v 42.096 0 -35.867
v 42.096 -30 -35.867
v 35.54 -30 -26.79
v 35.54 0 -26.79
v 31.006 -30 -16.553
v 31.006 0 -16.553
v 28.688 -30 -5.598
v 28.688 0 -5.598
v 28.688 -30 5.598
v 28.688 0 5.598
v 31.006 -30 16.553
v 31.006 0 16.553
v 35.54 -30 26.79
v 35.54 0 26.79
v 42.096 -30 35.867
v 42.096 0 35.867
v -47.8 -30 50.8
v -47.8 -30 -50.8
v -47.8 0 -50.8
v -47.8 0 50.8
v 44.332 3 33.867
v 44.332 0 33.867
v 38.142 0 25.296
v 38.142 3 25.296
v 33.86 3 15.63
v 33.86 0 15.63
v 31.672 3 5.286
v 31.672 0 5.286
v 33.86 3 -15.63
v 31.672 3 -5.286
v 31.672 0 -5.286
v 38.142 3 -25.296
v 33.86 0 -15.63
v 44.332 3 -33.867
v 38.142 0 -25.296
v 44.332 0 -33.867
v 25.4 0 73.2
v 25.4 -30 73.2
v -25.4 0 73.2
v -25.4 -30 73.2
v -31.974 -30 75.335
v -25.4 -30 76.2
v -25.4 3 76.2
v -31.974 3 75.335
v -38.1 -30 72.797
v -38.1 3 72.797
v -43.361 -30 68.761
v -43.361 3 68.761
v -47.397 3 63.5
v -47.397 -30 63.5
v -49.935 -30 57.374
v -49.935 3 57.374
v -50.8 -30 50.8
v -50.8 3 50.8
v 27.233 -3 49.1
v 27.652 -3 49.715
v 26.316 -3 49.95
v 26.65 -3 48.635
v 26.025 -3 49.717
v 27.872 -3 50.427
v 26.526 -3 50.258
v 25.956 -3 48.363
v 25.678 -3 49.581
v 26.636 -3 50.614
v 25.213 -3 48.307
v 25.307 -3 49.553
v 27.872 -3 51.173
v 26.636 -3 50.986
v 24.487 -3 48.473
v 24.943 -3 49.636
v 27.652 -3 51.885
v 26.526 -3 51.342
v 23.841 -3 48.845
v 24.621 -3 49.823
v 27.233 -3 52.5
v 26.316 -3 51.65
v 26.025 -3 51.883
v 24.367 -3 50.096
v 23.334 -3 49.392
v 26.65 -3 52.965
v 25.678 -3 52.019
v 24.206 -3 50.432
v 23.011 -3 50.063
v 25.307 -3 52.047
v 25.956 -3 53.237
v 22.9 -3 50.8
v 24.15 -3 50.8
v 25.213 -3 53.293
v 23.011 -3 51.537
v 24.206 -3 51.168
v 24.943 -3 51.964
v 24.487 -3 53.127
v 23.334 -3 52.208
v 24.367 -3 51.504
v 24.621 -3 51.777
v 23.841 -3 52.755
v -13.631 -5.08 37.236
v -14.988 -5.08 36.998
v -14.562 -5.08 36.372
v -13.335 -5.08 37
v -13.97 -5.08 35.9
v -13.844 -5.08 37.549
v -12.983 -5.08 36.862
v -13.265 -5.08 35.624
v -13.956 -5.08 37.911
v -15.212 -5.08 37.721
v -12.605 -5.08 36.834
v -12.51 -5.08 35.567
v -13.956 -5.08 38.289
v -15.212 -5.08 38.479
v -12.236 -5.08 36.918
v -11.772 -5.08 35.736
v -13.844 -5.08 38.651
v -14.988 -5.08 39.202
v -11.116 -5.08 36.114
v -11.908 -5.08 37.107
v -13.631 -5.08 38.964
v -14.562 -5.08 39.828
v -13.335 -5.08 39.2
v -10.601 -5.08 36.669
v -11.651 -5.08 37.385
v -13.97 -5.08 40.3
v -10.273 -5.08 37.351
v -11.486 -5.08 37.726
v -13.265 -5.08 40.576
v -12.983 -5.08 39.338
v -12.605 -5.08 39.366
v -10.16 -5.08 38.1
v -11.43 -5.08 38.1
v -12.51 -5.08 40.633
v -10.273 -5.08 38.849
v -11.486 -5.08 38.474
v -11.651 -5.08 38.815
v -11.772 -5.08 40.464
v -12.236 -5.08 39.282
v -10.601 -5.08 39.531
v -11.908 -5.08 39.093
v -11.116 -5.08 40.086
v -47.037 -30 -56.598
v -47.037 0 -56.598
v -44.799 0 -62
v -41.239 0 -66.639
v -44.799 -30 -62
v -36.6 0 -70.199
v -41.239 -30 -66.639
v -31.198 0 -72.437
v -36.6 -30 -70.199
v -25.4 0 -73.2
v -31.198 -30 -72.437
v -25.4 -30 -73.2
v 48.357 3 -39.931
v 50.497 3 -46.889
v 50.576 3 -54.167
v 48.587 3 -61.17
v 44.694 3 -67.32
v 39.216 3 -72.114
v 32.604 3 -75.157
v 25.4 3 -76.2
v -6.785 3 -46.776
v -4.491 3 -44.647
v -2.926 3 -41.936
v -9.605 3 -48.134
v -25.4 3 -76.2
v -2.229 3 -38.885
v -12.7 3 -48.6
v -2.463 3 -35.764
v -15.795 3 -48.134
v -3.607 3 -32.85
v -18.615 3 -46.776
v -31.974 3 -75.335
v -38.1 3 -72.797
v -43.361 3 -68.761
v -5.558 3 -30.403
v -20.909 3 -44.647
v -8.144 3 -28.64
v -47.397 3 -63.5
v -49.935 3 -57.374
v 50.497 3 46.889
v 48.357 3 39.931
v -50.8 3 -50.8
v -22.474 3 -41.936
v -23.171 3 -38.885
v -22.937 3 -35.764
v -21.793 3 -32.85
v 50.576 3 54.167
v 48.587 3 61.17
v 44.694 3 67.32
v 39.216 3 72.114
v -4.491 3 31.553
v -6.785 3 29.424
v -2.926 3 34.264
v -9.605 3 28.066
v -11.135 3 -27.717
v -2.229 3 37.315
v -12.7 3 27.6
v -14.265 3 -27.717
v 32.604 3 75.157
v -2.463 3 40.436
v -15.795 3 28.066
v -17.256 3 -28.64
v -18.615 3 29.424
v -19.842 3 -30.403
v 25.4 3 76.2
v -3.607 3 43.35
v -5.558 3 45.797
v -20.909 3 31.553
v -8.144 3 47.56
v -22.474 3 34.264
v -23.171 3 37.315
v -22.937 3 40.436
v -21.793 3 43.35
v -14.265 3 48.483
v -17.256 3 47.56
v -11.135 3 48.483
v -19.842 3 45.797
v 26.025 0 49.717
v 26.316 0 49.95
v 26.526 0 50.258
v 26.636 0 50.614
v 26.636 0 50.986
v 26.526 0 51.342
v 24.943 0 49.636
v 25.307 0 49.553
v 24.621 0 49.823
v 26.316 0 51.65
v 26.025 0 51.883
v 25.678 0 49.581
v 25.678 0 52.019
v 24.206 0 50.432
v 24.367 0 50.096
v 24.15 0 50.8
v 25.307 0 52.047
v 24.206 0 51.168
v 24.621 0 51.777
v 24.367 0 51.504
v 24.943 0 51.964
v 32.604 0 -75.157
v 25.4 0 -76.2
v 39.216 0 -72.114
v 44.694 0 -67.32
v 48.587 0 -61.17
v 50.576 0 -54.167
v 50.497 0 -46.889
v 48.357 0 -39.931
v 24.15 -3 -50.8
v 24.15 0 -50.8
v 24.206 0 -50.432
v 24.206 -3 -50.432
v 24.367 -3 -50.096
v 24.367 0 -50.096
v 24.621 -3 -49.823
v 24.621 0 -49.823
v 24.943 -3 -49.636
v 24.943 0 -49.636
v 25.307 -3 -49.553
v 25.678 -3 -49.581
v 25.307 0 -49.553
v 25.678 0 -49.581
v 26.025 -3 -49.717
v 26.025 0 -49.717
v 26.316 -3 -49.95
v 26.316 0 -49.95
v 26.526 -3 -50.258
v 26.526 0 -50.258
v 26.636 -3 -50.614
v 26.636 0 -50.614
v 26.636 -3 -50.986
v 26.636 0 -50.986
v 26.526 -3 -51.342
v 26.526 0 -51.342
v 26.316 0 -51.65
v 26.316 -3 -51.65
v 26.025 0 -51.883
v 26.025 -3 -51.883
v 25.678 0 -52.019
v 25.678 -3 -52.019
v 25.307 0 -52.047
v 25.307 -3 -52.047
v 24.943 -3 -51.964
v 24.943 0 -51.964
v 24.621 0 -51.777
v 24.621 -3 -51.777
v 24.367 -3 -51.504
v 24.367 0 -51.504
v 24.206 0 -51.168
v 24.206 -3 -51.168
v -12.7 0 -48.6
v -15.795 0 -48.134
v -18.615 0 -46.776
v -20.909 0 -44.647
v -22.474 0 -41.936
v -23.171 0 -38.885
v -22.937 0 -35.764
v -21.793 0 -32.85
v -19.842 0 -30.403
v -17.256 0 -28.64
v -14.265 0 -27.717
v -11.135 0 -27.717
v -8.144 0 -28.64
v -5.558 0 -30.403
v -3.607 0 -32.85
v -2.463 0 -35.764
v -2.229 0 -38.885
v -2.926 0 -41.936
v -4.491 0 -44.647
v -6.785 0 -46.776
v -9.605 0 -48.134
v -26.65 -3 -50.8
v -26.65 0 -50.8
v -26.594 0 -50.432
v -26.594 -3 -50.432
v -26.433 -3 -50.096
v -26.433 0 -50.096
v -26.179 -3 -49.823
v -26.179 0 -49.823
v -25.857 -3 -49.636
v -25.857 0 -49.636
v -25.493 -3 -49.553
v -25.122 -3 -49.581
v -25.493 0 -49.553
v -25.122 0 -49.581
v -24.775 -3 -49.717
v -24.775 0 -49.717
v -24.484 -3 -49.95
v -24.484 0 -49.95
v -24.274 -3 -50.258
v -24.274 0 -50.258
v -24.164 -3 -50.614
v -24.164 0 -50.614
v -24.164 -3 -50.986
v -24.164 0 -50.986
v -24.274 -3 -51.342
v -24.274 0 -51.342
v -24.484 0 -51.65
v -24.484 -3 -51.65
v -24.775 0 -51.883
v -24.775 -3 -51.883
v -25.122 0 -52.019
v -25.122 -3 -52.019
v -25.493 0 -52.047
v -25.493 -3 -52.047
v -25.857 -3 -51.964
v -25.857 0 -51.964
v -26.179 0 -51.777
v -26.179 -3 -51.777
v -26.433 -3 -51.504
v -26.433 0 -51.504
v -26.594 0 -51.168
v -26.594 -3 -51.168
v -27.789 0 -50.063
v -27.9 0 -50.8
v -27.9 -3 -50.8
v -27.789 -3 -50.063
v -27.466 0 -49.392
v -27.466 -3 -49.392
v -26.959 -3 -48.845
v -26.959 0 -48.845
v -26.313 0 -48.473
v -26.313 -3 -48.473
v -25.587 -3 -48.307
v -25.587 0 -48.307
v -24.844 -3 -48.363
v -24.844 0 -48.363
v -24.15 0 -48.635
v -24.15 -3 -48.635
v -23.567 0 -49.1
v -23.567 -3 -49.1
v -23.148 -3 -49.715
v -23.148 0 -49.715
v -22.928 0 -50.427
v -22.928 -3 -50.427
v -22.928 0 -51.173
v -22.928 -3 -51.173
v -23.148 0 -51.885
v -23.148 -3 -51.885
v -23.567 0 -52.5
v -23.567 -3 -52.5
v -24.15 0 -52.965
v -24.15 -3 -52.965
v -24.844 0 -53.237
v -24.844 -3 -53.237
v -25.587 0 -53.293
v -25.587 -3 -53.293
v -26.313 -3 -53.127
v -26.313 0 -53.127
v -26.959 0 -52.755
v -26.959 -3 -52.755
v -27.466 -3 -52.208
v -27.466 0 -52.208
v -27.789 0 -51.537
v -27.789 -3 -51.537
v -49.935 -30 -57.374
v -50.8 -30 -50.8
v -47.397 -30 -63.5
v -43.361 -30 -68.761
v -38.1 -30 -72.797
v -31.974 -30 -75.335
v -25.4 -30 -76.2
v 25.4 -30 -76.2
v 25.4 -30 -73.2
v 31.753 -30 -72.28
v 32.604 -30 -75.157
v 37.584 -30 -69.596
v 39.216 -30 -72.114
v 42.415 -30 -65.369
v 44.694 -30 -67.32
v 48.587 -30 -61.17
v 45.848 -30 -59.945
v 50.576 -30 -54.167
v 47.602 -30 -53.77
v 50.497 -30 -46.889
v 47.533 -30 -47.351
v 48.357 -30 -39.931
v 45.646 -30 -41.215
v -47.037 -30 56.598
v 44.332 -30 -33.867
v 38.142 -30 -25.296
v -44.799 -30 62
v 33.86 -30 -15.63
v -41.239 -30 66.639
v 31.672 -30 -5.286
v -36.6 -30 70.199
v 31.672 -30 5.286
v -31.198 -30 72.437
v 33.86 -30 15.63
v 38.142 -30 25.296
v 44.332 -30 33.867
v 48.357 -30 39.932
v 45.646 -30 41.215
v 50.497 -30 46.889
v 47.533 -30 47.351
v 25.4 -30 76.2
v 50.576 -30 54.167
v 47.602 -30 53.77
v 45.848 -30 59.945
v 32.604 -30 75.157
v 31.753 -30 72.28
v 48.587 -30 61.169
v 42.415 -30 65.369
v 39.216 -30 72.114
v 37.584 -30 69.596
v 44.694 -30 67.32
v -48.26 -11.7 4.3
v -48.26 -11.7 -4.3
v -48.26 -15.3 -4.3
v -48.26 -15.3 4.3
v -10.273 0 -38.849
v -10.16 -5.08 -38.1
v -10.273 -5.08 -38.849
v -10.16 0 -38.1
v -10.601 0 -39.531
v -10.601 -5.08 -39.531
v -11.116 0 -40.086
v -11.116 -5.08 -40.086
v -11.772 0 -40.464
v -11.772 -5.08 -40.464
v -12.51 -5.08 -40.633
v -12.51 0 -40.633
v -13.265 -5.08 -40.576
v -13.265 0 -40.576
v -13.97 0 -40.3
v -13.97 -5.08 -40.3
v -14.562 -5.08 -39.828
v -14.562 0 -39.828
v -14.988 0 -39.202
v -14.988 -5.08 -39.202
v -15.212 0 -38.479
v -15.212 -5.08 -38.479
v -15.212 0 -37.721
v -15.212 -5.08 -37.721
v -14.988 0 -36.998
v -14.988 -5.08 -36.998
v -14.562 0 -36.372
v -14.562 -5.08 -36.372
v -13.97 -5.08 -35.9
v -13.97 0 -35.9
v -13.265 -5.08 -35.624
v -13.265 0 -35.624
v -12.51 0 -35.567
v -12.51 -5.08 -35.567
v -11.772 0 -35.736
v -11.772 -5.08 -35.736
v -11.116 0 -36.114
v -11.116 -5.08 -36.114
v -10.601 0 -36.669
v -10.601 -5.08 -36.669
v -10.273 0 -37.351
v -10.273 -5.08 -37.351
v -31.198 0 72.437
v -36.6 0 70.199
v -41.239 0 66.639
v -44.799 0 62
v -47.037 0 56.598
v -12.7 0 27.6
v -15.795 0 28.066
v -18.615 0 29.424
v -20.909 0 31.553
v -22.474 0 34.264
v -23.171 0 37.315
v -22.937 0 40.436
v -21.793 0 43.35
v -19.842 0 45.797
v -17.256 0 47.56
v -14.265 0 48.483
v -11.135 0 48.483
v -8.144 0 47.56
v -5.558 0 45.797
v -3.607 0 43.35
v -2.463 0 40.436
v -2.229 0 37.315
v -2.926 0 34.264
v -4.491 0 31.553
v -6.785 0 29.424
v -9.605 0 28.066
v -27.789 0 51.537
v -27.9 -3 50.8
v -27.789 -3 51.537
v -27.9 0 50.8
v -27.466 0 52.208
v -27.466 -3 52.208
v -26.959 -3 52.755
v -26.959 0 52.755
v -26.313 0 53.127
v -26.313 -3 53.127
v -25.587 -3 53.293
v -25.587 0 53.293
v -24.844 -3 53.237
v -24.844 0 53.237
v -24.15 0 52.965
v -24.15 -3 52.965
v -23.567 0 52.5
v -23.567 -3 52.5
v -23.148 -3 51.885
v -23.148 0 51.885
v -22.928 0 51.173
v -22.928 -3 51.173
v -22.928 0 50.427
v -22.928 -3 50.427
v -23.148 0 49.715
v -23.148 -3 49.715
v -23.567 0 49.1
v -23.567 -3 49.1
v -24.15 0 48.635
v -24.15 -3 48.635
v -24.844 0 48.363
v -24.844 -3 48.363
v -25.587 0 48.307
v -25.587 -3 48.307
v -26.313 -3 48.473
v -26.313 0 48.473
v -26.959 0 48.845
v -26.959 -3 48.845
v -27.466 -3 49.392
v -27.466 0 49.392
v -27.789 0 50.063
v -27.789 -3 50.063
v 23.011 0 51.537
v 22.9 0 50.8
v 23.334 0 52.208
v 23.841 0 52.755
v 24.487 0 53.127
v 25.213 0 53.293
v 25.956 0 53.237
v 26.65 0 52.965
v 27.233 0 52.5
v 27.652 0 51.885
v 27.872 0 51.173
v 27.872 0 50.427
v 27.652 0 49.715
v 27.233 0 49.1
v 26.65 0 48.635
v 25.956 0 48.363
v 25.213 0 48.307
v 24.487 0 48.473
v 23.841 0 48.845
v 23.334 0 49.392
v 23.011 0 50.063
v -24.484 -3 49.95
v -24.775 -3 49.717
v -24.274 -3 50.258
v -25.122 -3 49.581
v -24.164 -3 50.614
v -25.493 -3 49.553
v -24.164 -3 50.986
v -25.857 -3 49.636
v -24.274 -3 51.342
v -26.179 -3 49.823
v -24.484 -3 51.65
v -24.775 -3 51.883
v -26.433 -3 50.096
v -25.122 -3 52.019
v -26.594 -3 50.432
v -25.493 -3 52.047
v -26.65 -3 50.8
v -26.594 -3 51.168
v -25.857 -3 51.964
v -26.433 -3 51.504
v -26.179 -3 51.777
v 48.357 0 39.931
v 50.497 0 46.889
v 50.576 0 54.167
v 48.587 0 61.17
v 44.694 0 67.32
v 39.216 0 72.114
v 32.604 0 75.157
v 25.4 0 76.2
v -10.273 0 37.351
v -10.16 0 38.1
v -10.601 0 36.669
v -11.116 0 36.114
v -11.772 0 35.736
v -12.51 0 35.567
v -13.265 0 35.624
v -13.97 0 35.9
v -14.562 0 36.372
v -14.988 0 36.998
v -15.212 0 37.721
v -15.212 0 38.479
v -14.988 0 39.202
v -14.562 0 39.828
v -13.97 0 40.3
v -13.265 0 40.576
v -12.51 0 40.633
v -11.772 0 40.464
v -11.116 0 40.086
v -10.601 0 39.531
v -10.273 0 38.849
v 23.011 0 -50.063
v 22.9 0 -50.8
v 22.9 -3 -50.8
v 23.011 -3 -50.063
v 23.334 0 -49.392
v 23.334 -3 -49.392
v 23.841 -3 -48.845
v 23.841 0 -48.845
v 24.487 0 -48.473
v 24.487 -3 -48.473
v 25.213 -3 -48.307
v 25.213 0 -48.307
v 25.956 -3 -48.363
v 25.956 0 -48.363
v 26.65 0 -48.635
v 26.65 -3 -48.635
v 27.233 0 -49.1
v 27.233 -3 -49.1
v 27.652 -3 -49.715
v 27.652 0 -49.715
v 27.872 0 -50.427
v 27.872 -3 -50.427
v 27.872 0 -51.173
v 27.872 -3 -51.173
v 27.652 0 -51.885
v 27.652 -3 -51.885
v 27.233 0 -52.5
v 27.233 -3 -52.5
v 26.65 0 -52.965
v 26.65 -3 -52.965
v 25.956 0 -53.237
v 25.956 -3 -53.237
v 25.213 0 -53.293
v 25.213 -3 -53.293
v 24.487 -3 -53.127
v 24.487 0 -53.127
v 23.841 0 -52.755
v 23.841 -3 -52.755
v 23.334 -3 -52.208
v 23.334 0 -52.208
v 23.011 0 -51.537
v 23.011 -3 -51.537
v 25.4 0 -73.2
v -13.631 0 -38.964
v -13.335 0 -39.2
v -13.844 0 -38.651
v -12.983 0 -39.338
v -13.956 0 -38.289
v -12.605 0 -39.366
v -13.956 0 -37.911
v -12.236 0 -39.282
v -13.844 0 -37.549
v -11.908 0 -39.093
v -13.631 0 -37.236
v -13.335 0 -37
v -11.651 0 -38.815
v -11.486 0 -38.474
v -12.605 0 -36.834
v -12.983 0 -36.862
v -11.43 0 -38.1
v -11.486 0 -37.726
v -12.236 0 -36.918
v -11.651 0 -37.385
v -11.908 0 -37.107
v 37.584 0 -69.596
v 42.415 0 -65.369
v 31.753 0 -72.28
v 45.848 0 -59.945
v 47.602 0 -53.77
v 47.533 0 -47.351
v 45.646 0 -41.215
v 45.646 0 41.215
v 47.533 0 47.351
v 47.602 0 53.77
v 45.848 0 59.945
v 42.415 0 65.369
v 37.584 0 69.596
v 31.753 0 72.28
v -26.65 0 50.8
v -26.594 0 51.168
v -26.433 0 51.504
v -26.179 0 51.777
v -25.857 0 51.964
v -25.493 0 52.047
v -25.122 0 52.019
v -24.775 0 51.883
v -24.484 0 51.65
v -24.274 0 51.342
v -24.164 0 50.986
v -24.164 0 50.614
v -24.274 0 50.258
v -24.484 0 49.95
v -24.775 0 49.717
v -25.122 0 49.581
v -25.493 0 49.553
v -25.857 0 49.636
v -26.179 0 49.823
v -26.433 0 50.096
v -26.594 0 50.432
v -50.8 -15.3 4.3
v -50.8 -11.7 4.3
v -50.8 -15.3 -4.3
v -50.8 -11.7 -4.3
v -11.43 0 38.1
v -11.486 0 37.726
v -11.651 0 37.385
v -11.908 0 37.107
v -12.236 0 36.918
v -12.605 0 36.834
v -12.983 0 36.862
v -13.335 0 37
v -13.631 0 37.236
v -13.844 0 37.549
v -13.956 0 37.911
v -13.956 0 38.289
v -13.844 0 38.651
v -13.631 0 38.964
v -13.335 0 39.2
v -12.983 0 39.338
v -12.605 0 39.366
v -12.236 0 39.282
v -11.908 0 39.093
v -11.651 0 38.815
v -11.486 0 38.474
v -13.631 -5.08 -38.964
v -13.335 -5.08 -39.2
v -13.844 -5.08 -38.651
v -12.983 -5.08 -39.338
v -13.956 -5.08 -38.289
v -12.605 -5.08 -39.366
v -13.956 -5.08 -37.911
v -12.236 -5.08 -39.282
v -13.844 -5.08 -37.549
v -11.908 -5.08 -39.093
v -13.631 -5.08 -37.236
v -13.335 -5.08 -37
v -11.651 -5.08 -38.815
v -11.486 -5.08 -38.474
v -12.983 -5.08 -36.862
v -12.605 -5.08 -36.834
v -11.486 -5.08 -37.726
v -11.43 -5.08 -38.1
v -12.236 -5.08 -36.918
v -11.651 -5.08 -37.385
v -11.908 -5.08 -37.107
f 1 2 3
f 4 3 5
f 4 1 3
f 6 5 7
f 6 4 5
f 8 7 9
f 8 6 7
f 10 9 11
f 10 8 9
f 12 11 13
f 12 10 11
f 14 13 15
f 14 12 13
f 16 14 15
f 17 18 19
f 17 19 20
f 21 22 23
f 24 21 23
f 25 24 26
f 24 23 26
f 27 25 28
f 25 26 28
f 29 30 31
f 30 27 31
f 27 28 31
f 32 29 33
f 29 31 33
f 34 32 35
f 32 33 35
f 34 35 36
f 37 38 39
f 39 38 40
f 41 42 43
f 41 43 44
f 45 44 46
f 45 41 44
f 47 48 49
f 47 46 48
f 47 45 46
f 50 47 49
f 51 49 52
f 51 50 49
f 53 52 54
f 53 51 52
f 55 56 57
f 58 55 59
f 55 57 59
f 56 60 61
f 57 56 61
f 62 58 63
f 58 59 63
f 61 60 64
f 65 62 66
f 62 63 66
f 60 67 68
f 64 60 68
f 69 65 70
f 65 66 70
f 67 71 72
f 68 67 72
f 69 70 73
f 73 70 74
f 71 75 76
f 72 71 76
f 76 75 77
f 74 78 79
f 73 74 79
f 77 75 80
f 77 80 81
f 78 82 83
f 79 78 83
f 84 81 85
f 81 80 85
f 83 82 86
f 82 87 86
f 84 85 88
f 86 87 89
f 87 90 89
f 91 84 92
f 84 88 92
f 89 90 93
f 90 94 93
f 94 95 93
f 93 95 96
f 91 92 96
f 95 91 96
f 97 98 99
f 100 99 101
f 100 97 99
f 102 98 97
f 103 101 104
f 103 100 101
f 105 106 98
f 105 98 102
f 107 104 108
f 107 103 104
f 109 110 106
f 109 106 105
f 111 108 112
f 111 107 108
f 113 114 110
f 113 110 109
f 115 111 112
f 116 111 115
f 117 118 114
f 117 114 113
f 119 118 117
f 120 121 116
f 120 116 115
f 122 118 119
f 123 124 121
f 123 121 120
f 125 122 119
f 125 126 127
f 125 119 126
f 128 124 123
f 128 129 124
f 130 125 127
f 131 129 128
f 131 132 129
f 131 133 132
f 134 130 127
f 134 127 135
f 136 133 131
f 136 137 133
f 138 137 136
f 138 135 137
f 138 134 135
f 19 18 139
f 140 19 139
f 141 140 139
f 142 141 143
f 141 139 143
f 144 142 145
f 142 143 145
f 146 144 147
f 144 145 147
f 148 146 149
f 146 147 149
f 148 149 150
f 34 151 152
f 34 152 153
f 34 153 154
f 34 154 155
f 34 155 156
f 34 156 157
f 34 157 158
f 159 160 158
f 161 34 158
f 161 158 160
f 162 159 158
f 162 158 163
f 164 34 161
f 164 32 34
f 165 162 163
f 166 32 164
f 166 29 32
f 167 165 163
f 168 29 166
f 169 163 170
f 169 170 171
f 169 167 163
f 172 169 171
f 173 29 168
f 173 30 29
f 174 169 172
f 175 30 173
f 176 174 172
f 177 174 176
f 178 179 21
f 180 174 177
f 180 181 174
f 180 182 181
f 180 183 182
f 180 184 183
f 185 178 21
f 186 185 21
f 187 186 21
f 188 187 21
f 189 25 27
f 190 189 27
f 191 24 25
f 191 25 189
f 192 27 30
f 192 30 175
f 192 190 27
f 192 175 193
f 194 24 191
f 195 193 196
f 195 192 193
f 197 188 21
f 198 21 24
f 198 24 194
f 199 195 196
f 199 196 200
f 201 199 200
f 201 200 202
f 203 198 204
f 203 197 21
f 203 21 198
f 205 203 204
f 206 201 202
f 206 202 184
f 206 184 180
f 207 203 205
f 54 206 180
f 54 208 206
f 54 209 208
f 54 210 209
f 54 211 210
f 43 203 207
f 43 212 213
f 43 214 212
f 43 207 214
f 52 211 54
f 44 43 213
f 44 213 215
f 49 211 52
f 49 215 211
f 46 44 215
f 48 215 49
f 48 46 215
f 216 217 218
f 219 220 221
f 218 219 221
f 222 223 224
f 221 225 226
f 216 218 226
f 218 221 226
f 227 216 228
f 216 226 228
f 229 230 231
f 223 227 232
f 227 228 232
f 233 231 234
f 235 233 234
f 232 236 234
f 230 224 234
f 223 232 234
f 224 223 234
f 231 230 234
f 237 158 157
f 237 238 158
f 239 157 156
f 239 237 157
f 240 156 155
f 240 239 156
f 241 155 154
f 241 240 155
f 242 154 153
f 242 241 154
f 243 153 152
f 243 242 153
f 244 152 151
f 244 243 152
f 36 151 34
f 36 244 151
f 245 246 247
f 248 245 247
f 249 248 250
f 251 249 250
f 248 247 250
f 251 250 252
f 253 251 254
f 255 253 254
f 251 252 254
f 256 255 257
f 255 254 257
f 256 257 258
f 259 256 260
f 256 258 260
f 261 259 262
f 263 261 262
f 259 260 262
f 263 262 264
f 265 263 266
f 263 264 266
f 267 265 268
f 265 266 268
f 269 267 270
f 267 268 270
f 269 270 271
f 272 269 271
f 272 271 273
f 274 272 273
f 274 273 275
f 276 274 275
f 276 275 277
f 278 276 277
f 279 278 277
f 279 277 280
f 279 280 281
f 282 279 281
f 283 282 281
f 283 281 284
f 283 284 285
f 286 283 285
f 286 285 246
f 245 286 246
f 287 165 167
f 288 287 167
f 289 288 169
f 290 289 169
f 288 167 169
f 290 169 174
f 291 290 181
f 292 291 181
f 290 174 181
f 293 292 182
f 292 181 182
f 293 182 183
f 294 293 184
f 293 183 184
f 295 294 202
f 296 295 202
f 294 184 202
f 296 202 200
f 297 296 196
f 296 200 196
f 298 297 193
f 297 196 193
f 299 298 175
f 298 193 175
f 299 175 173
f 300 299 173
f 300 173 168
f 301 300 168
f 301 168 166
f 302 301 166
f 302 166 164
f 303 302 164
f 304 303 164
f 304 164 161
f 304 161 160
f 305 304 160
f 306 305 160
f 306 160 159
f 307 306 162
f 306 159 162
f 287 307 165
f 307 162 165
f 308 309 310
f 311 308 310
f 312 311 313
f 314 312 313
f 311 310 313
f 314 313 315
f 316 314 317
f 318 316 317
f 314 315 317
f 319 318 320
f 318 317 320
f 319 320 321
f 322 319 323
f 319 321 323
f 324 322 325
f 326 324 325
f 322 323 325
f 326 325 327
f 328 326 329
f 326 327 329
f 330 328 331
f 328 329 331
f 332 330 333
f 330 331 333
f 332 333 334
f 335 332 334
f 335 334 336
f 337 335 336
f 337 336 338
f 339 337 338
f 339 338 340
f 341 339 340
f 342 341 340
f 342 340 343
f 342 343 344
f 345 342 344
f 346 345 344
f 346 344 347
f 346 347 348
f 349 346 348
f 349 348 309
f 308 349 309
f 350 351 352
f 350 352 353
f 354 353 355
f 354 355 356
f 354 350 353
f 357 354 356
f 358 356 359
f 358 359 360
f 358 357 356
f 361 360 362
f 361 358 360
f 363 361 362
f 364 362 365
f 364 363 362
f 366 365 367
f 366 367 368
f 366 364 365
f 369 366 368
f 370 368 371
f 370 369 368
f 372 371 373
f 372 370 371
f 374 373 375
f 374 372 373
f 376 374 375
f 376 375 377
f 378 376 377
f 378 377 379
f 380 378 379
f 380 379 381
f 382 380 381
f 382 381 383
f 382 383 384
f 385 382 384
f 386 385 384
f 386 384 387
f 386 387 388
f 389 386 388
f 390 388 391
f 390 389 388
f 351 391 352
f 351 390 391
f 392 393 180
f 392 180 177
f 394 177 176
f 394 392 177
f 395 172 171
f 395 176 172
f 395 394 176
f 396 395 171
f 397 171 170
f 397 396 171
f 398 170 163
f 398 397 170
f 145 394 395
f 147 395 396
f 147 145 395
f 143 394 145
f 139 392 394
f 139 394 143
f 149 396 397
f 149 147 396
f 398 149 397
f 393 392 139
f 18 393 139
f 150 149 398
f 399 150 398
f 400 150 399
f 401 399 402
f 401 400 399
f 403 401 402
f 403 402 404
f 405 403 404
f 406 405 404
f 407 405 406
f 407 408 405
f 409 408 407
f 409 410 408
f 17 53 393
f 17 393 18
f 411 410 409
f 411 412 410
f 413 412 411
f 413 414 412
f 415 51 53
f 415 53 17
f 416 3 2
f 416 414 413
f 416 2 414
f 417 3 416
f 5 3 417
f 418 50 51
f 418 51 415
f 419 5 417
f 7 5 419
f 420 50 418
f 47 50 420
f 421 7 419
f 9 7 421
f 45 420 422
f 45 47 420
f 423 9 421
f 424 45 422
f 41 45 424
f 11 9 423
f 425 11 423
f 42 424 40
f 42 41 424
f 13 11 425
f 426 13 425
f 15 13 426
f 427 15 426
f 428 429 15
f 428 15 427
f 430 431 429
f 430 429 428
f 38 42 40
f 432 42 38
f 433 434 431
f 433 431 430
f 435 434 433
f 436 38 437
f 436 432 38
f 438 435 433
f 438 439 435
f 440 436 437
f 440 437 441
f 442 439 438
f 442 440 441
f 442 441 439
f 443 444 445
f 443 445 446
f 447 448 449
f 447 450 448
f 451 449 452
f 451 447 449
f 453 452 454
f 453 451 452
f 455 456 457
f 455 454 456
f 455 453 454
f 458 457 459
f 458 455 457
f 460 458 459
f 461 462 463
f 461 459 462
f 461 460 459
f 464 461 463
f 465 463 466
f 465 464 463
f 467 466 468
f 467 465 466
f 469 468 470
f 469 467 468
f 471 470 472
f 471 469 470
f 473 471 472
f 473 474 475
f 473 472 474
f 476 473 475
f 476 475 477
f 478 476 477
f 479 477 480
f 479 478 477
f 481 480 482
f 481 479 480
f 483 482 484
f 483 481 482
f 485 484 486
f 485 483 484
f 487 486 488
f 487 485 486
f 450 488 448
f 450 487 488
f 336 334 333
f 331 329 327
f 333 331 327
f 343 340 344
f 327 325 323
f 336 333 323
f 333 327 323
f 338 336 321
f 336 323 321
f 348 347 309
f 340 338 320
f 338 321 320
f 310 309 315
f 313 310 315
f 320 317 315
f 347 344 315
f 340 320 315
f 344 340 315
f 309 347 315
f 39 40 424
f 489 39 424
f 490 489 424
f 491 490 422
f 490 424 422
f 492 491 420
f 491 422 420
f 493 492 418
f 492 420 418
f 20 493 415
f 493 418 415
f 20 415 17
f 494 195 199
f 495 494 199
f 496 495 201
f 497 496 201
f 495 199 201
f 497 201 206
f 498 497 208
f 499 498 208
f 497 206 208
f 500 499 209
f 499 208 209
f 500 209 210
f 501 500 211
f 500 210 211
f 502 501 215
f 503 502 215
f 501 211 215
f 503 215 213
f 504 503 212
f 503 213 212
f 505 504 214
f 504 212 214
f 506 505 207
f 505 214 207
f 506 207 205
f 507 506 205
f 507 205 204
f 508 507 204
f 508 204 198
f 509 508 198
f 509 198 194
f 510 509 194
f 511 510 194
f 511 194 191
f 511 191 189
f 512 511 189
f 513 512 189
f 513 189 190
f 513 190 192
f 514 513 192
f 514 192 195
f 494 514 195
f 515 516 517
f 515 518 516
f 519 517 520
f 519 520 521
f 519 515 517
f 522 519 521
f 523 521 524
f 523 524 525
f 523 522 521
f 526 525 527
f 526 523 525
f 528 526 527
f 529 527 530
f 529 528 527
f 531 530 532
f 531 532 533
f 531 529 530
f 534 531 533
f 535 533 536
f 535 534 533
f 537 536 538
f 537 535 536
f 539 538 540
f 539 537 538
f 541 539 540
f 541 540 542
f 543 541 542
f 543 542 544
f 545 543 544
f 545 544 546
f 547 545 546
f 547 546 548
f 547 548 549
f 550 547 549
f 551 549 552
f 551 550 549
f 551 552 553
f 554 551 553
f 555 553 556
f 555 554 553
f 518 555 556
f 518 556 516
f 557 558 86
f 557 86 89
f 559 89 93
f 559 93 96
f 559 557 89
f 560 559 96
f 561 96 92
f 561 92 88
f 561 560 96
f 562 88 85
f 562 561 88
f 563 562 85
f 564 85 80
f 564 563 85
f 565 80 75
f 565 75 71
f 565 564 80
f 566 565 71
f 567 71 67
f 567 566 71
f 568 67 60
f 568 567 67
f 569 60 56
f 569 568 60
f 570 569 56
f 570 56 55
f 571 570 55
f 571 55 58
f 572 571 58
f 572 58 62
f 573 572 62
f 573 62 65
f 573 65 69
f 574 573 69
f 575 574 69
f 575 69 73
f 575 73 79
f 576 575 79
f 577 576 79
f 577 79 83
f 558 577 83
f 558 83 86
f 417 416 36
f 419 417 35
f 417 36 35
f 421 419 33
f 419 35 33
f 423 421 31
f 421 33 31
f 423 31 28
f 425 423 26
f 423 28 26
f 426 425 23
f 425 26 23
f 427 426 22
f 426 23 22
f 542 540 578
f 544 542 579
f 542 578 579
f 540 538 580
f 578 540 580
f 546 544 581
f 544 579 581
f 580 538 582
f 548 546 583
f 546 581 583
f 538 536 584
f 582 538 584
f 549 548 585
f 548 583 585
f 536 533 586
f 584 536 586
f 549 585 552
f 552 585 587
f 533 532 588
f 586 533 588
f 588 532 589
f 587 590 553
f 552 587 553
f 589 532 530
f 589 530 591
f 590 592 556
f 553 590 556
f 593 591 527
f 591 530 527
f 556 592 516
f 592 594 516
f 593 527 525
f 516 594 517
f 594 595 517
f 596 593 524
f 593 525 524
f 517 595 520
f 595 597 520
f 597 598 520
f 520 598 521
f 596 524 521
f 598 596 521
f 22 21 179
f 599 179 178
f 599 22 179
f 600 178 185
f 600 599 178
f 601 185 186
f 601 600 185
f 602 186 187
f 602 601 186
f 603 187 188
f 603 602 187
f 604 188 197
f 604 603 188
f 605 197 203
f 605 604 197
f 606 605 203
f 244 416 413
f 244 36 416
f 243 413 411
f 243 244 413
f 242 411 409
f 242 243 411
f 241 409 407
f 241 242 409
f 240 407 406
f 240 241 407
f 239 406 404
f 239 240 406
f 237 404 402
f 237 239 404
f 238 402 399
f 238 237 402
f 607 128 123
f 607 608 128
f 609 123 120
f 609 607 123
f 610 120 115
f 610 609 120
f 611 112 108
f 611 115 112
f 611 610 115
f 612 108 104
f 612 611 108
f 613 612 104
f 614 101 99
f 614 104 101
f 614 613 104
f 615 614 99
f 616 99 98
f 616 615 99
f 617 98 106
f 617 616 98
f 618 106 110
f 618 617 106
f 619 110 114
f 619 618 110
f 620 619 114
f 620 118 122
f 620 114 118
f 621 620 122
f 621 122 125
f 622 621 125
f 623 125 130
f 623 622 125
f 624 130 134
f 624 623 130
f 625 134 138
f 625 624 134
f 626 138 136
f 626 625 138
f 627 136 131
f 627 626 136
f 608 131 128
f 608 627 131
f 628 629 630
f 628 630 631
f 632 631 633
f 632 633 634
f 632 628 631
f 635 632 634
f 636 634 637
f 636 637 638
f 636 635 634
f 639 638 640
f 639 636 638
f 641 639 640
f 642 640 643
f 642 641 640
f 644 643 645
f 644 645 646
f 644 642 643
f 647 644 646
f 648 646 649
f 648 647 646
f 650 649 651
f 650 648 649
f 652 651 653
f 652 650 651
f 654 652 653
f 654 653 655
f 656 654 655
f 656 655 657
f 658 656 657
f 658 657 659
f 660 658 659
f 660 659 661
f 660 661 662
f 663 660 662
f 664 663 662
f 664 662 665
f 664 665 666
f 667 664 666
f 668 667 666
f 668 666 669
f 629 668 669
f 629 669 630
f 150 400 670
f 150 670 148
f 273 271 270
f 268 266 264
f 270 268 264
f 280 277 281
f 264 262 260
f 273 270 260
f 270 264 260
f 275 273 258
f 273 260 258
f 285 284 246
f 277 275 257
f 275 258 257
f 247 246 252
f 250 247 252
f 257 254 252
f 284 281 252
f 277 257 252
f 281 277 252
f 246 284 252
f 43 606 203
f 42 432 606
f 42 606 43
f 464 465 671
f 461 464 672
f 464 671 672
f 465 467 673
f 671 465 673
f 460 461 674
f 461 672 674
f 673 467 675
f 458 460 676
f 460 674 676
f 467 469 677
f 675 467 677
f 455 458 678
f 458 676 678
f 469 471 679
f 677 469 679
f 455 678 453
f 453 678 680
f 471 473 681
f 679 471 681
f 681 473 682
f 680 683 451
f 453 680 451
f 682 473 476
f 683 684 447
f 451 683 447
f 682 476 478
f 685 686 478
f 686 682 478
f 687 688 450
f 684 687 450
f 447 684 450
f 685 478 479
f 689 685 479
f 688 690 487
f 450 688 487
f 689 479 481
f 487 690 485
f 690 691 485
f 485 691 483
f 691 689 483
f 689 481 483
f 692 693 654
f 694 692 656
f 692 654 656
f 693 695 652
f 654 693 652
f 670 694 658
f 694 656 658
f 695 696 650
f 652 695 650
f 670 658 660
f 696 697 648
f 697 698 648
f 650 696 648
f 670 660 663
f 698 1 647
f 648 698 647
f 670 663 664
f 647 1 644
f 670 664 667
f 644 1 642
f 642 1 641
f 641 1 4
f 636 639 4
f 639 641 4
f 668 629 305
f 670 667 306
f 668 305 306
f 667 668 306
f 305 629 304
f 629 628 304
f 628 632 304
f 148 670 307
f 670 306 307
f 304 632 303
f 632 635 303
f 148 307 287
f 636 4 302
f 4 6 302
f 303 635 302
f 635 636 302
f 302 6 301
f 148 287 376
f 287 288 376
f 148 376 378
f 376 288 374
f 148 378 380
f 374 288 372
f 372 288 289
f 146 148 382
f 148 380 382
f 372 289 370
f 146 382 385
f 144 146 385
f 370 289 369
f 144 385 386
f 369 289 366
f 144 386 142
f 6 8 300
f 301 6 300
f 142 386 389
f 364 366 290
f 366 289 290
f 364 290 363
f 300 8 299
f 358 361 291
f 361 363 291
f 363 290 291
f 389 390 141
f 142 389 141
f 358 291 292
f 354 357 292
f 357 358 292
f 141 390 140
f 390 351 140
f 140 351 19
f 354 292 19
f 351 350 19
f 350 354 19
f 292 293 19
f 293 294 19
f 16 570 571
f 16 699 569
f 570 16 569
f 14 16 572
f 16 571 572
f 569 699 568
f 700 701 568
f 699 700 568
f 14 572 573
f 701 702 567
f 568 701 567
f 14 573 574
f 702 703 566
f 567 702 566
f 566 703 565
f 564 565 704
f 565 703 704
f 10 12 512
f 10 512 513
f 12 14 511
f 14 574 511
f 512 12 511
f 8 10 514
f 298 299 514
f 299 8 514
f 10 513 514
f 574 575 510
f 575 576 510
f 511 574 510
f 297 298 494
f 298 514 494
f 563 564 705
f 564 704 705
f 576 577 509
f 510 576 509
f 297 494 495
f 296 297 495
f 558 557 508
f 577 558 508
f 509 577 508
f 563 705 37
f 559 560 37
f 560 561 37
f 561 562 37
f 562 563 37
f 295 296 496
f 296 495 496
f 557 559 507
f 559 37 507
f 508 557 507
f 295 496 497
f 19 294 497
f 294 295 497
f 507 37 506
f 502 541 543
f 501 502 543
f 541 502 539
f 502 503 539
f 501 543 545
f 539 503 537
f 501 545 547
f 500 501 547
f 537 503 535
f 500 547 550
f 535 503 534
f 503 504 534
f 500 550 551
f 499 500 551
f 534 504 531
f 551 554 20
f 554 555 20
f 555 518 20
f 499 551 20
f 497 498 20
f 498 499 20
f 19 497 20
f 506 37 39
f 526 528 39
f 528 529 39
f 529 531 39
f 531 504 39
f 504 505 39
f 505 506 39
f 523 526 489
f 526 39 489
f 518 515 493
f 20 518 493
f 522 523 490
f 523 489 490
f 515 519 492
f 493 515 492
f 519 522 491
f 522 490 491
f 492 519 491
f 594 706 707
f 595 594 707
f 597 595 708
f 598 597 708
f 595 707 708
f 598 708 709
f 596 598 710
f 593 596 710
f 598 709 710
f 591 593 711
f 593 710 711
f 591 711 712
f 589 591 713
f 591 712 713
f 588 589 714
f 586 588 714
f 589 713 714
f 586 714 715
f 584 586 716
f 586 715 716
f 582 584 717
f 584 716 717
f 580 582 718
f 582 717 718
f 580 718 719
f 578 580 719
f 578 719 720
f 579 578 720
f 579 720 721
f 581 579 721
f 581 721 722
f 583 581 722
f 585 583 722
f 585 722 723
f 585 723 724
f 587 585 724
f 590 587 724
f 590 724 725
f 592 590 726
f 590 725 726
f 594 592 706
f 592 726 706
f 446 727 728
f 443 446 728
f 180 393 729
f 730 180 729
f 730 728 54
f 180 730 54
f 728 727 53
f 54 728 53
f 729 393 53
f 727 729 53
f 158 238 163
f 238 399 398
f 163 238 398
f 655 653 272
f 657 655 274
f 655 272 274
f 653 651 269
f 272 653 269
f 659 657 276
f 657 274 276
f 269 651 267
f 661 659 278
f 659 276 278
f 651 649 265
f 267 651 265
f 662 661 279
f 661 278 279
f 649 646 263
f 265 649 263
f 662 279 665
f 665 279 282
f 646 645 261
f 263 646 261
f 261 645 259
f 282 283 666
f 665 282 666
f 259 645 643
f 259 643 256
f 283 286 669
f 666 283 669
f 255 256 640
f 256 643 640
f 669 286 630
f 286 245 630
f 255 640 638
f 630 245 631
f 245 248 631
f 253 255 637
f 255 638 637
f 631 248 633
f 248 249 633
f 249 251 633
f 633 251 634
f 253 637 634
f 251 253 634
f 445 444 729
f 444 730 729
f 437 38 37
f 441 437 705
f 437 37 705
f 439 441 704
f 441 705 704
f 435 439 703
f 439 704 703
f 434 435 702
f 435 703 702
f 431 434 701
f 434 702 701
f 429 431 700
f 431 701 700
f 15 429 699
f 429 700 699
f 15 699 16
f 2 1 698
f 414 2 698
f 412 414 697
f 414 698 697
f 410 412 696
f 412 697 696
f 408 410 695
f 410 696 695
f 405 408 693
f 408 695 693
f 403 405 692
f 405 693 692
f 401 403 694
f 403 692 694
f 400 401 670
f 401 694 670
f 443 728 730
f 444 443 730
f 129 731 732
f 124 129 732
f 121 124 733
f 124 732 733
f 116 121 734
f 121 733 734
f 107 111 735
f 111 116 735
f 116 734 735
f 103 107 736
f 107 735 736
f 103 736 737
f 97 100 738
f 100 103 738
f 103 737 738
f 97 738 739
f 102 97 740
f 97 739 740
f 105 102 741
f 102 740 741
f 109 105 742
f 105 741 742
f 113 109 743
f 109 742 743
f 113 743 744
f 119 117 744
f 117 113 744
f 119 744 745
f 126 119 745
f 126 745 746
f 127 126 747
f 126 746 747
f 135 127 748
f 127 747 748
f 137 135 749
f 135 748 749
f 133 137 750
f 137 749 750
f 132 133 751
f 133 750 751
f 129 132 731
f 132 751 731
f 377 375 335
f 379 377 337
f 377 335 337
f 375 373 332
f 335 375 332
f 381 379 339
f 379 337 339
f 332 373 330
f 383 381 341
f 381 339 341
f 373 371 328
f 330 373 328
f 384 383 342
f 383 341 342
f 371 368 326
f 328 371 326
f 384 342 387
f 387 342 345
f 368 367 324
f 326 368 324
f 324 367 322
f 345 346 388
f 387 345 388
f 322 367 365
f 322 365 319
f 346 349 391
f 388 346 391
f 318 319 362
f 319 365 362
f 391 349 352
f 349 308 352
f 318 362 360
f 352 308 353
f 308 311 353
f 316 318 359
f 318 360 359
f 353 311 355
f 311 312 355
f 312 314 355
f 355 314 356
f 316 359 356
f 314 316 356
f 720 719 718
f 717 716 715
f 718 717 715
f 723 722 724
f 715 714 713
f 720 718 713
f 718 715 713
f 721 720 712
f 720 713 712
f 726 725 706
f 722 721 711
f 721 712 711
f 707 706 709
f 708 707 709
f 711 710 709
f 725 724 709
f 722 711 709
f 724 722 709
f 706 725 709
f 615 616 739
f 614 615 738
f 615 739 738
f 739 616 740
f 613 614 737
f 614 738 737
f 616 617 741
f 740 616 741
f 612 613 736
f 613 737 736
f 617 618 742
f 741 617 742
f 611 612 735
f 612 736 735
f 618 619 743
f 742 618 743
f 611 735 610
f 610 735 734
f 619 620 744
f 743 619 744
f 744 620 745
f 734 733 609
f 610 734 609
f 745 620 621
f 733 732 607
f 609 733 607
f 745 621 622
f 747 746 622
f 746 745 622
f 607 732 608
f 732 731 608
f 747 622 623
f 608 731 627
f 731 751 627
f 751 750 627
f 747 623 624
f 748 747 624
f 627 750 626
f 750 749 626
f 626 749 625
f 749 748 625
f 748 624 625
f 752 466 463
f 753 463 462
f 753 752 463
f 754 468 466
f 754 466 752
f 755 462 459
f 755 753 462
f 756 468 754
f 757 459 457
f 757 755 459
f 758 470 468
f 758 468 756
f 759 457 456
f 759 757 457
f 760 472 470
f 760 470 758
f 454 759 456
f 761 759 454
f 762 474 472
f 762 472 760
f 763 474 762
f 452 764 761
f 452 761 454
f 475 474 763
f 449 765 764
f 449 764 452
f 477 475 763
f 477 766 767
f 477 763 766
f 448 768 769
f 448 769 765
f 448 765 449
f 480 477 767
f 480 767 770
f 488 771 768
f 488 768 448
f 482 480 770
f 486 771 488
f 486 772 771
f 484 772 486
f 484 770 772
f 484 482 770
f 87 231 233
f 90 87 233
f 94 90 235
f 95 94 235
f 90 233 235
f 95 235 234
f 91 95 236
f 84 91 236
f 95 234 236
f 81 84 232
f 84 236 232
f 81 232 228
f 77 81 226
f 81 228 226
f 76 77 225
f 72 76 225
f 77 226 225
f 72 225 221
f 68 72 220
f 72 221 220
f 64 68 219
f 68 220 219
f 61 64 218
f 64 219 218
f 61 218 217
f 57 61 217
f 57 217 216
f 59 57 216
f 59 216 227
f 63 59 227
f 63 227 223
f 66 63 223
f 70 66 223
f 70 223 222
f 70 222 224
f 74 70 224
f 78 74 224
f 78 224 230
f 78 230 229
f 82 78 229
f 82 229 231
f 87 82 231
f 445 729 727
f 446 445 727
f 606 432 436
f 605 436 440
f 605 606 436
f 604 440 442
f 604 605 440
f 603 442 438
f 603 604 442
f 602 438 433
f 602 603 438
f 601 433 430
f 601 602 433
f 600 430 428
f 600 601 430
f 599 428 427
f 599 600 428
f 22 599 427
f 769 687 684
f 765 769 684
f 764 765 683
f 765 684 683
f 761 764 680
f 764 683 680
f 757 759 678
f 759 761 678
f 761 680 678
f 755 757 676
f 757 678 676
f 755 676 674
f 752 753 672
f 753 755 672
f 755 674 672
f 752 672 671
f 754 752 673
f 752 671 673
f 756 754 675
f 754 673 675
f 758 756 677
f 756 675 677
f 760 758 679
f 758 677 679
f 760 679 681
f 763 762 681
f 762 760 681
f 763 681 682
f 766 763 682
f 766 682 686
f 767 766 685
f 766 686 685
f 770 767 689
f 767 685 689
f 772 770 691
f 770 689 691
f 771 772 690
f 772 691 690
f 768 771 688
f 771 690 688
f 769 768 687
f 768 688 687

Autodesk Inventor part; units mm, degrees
ref_plane "YZ Plane" through (0, 0, 0) normal (1, 0, 0) x (0, 1, 0)
ref_plane "XZ Plane" through (0, 0, 0) normal (0, 1, 0) x (-1, 0, 0)
ref_plane "XY Plane" through (0, 0, 0) normal (0, 0, 1) x (1, 0, 0)
sketch "Sketch1" plane through (0, 0, 0) normal (0, 1, 0) x (-1, 0, 0)
  line L0 (-25.4, 76.2) -> (25.4, 76.2)
  line L1 (50.8, 76.2) -> (-50.8, 76.2)
  line L2 (-50.8, 50.8) -> (-50.8, -50.8)
  line L3 (50.8, 76.2) -> (-50.8, 76.2)
  line L4 (-25.4, -76.2) -> (25.4, -76.2)
  line L5 (50.8, -50.8) -> (50.8, 50.8)
  arc A0 (50.8, 50.8) -> (25.4, 76.2) centre (25.4, 50.8) ccw
  arc A1 (25.4, -76.2) -> (50.8, -50.8) centre (25.4, -50.8) ccw
  arc A2 (-50.8, -50.8) -> (-25.4, -76.2) centre (-25.4, -50.8) ccw
  arc A3 (-25.4, 76.2) -> (-50.8, 50.8) centre (-25.4, 50.8) ccw
  circle A4 centre (-25.4, 50.8) radius 25.4
  circle A5 centre (-25.4, -50.8) radius 25.4
  circle A6 centre (-50.8, 0) radius 31.3961
  circle A7 centre (-82.1961, 0) radius 50.8
  circle A8 centre (25.4, -50.8) radius 2.5
  circle A9 centre (25.4, -50.8) radius 1.25
  circle A10 centre (25.4, 50.8) radius 2.5
  circle A11 centre (25.4, 50.8) radius 1.25
  circle A12 centre (-25.4, 50.8) radius 2.5
  circle A13 centre (-25.4, 50.8) radius 1.25
  circle A14 centre (-25.4, -50.8) radius 2.5
  circle A15 centre (-25.4, -50.8) radius 1.25
  line L6 (-31.3961, 0) -> (50.8, 0)
  point P0 (-36.7592, 28.0815)
  point P1 (-36.7592, -28.0815)
  point P2 (12.7, 38.1)
  point P3 (12.7, -38.1)
  point P4 (-50.8, -31.3961)
  point P5 (-50.8, 31.3961)
  point P6 (-44.332, -33.8667)
  point P7 (-44.332, 33.8667)
  point P8 (9.7019, 0)
  point P9 (0.3879, -59.1619)
  point P10 (-13.7063, -28.2519)
  dimension "d6" = 101.6
  dimension "d21" = 25.4
  dimension "d68" = 2.5
  dimension "d69" = 2.5
  dimension "d70" = 2.5
  dimension "d71" = 2.5
  dimension "d72" = 5
  dimension "d73" = 5
  dimension "d74" = 5
  dimension "d75" = 5
extrude "Extrusion4" add sketch "Sketch1" along normal blind 3 contours A4 A3 | L0 A0 L5 L6 A6 A4 | A4 A6 A7 | A6 L6 A7 | L5 A1 L4 A5 A6 L6 | A6 A7 L6 | A5 A2 | A7 A6 A5 | A8 | A9 | A10 | A11 | A12 | A13 | A14 | A15
hole "Hole3" at (-12.7, 0, 38.1) at (-12.7, 0, -38.1) direction (0, 1, 0) diameter 21 depth 25.4 tip angle 118
sketch "Sketch5" plane through (0, 0, 0) normal (0, -1, 0) x (1, 0, 0)
  arc A0 (36.7592, 28.0815) -> (36.7592, -28.0815) centre (50.8, 0) ccw projected
  arc A1 (36.7592, 28.0815) -> (36.7592, -28.0815) centre (50.8, 0) ccw
  arc A2 (44.332, 33.8667) -> (25.4, 76.2) centre (25.4, 50.8) ccw projected
  arc A3 (36.7592, 28.0815) -> (25.4, 76.2) centre (25.4, 50.8) ccw
  arc A4 (25.4, -76.2) -> (44.332, -33.8667) centre (25.4, -50.8) ccw projected
  arc A5 (25.4, -76.2) -> (36.7592, -28.0815) centre (25.4, -50.8) ccw
  arc A6 (-25.4, 76.2) -> (-50.8, 50.8) centre (-25.4, 50.8) ccw projected
  line L0 (-50.8, -50.8) -> (-50.8, 50.8) projected
  arc A7 (-25.4, 76.2) -> (-50.8, 50.8) centre (-25.4, 50.8) ccw
  arc A8 (-50.8, -50.8) -> (-25.4, -76.2) centre (-25.4, -50.8) ccw projected
  arc A9 (-50.8, -50.8) -> (-25.4, -76.2) centre (-25.4, -50.8) ccw
  line L1 (-25.4, 76.2) -> (25.4, 76.2) projected
  line L2 (25.4, 76.2) -> (-25.4, 76.2)
  line L3 (25.4, -76.2) -> (-25.4, -76.2) projected
  line L4 (25.4, -76.2) -> (-25.4, -76.2)
  line L5 (-50.8, 50.8) -> (-50.8, -50.8)
  arc A10 (44.332, 33.8667) -> (25.4, 76.2) centre (25.4, 50.8) ccw
  arc A11 (44.332, 33.8667) -> (44.332, -33.8667) centre (82.1961, 0) ccw projected
  arc A12 (44.332, 33.8667) -> (44.332, -33.8667) centre (82.1961, 0) ccw
  arc A13 (25.4, -76.2) -> (44.332, -33.8667) centre (25.4, -50.8) ccw
  arc A14 (-50.8, -50.8) -> (-25.4, -76.2) centre (-25.4, -50.8) ccw
  arc A15 (-25.4, 76.2) -> (-50.8, 50.8) centre (-25.4, 50.8) ccw projected
  arc A16 (-25.4, 76.2) -> (-50.8, 50.8) centre (-25.4, 50.8) ccw
  line L6 (-25.4, 76.2) -> (25.4, 76.2)
  line L7 (-50.8, 50.8) -> (-50.8, -50.8)
  line L8 (-25.4, -76.2) -> (25.4, -76.2)
  point P0 (0, 0)
  point P1 (-12.7, 38.1)
  point P2 (-12.7, -38.1)
extrude "Extrusion5" add sketch "Sketch5" along normal blind 30
shell "Shell1" thickness 3 removed faces 3 at (-23.4013, -30, 0) at (-13.5376, 0, 41.4983) at (-15.9531, 0, -34.6)
sketch "Sketch6" plane through (-25.4, 0, 73.2) normal (0, -1, 0) x (1, 0, 0)
  circle A0 centre (12.7, -111.3) radius 10.5 projected
  circle A1 centre (12.7, -35.1) radius 10.5 projected
  circle A2 centre (12.7, -111.3) radius 1.27
  circle A3 centre (12.7, -35.1) radius 1.27
  circle A4 centre (12.7, -111.3) radius 2.54
  circle A5 centre (12.7, -35.1) radius 2.54
  point P0 (25.4, -73.2)
  dimension "d45" = 2.54
  dimension "d46" = 2.54
  dimension "d47" = 5.08
  dimension "d48" = 5.08
extrude "Extrusion6" add sketch "Sketch6" along normal blind 5.08 contours A4 | A5
sketch "Sketch8" plane through (-50.8, 3, -50.8) normal (-1, 0, 0) x (0, 0, 1)
  line L0 (0, -33) -> (101.6, -33) projected
  line L1 (0, 0) -> (101.6, 0)
  line L2 (101.6, 0) -> (101.6, -33)
  line L3 (101.6, -33) -> (0, -33)
  line L4 (0, -33) -> (0, 0)
  line L5 (50.8, 0) -> (50.8, -33)
  line L6 (0, -16.5) -> (101.6, -16.5)
  line L7 (50.8, -16.5) -> (55.1, -16.5)
  line L8 (55.1, -16.5) -> (55.1, -14.7)
  line L9 (50.8, -16.5) -> (46.5, -16.5)
  line L10 (46.5, -16.5) -> (46.5, -18.3)
  line L11 (55.1, -14.7) -> (46.5, -14.7)
  line L12 (46.5, -14.7) -> (46.5, -18.3)
  line L13 (46.5, -18.3) -> (55.1, -18.3)
  line L14 (55.1, -18.3) -> (55.1, -14.7)
  point P0 (50.8, -3)
  dimension "d82" = 4.3
  dimension "d83" = 4.3
  dimension "d84" = 1.8
  dimension "d85" = 1.8
extrude "Extrusion8" cut sketch "Sketch8" against normal blind 2.54 contours L13 L10 L6 L5 | L5 L6 L14 L13 | L12 L11 L5 L6 | L5 L11 L8 L6
extrude "Extrusion9" add sketch "Sketch1" against normal blind 3 contours A8 | A10 | A12 | A14
equation "\"d69\" = d68"
equation "\"d70\" = d68"
equation "\"d71\" = d68"
equation "\"d73\" = d72"
equation "\"d74\" = d73"
equation "\"d75\" = d72"
equation "\"d83\" = d82"
equation "\"d85\" = d84"
properties part number "ControllerTop"
